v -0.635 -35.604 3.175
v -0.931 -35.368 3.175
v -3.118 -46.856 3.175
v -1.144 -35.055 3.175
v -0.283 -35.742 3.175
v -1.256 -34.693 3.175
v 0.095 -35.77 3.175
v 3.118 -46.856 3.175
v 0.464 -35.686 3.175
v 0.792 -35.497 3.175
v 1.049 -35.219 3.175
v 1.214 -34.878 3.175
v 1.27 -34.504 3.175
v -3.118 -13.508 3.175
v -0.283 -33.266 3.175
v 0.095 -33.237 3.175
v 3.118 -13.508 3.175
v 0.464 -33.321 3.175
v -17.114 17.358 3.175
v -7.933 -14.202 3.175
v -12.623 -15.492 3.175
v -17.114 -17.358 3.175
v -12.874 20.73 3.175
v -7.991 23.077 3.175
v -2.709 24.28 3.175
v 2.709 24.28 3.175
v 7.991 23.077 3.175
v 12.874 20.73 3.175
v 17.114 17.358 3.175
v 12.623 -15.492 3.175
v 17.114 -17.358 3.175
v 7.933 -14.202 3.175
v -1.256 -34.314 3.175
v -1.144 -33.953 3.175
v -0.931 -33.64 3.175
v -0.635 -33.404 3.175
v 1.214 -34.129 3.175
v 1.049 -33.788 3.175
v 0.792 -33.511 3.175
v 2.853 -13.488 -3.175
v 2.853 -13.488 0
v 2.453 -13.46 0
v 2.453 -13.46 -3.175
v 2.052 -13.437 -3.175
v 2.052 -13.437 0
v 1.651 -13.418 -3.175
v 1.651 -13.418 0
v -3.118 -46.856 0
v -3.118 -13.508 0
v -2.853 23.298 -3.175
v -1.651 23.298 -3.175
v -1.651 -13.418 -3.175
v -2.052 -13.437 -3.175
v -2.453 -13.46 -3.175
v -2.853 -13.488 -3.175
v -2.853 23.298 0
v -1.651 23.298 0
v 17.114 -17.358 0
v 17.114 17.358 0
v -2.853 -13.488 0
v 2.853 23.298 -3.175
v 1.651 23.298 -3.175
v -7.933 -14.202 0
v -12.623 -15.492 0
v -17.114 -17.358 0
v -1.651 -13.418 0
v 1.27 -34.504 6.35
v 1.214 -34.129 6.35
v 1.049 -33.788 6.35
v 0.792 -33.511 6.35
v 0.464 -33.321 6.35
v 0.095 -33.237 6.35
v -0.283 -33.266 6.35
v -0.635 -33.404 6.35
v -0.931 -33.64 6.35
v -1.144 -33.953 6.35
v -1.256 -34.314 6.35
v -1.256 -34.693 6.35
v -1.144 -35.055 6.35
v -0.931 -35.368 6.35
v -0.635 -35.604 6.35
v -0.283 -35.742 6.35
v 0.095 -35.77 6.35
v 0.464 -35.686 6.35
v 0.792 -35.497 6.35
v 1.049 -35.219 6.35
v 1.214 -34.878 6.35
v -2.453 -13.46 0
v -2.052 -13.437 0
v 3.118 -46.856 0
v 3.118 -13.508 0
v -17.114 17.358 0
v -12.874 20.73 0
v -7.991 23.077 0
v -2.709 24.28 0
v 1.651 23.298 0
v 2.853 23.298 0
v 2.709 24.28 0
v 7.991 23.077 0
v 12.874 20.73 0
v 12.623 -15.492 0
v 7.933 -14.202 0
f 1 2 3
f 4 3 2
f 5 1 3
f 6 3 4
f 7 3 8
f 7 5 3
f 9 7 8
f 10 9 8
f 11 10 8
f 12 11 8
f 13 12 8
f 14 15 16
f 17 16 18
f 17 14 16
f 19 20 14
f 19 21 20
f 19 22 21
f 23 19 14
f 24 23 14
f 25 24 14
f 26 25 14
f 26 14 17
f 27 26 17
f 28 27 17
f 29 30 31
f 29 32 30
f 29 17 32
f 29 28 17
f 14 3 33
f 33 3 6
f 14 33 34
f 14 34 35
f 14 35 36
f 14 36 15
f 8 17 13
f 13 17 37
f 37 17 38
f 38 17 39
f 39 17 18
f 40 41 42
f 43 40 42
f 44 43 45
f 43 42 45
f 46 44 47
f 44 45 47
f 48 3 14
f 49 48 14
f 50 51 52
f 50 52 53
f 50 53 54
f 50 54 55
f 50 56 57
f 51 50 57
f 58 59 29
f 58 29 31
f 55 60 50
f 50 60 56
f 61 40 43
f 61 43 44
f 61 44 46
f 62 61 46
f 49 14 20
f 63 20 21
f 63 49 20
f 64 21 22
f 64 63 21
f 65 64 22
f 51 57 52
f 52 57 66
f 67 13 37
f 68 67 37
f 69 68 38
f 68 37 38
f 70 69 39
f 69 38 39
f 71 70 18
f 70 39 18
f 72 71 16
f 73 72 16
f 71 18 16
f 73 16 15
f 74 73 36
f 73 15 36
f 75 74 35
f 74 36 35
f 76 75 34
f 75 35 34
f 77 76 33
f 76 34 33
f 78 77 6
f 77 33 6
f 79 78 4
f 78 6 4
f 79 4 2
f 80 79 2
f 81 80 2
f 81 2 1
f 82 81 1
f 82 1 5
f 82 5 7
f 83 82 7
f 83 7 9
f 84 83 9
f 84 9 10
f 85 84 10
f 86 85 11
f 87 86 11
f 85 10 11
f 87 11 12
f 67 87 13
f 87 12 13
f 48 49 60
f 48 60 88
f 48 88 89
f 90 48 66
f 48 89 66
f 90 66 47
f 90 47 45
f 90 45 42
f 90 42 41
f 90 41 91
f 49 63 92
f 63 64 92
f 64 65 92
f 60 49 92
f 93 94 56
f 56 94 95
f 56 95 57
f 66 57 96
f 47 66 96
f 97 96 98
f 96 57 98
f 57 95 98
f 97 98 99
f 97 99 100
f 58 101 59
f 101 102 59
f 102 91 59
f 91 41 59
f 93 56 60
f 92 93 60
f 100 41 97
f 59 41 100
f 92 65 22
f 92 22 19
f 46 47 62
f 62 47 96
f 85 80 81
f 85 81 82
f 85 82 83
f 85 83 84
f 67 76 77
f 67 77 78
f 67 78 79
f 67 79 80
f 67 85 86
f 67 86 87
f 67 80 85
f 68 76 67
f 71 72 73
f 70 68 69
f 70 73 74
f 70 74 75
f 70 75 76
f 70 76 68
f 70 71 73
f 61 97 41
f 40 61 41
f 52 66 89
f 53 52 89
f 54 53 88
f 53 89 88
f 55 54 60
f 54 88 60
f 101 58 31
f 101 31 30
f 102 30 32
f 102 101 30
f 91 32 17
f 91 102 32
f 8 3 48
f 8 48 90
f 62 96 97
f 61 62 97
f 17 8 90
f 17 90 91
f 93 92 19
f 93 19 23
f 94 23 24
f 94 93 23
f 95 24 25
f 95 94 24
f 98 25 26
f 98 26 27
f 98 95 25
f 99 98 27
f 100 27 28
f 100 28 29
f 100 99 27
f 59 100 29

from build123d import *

# Parameters (mm, degrees)
BOSS_EXTRUDE1_DEPTH = 3.175
BOSS_EXTRUDE2_DEPTH = 3.175
SKETCH3_W           = 6.236959702
SKETCH3_H           = 47.194711522
BOSS_EXTRUDE3_DEPTH = 3.175
SKETCH4_R           = 1.27
BOSS_EXTRUDE4_DEPTH = 3.175


with BuildPart() as part:
    # Sketch1 → Boss-Extrude1 (new body)
    with BuildSketch(Plane.XY):
        with BuildLine():
            Line((-17.114253333, -17.357583949), (-17.114253333, 17.357583949))
            ThreePointArc((-17.114253333, 17.357583949), (0, 24.432200125), (17.114253333, 17.357583949))
            Line((17.114253333, 17.357583949), (17.114253333, -17.357583949))
            ThreePointArc((17.114253333, -17.357583949), (0, -13.382802691), (-17.114253333, -17.357583949))
        make_face()
    extrude(amount=BOSS_EXTRUDE1_DEPTH)

    # Sketch2 → Boss-Extrude2 (add)
    with BuildSketch(Plane(origin=(0, 0, 0), x_dir=(-1, 0, 0), z_dir=(0, 0, -1))):
        with BuildLine():
            Line((-1.65128862, -13.417928303), (-1.65128862, 22.268343179))
            Line((-1.65128862, 22.268343179), (-1.65128862, 23.29835294))
            Line((-1.65128862, 23.29835294), (-2.853426735, 23.29835294))
            Line((-2.853426735, 23.29835294), (-2.853426735, -13.48778167))
            ThreePointArc((-2.853426735, -13.48778167), (-2.25262846, -13.448194961), (-1.65128862, -13.417928303))
        make_face()
        with BuildLine():
            Line((1.65128862, 23.29835294), (1.65128862, 22.268343179))
            Line((1.65128862, 22.268343179), (1.65128862, -13.417928303))
            ThreePointArc((1.65128862, -13.417928303), (2.25262846, -13.448194961), (2.853426735, -13.48778167))
            Line((2.853426735, -13.48778167), (2.853426735, 23.29835294))
            Line((2.853426735, 23.29835294), (1.65128862, 23.29835294))
        make_face()
    extrude(amount=BOSS_EXTRUDE2_DEPTH)

    # Sketch3 → Boss-Extrude3 (add)
    with BuildSketch(Plane.XY.offset(3.175)):
        with Locations((0, -23.258467244)):
            Rectangle(SKETCH3_W, SKETCH3_H)
    extrude(amount=-BOSS_EXTRUDE3_DEPTH)

    # Sketch4 → Boss-Extrude4 (add)
    with BuildSketch(Plane.XY.offset(3.175)):
        with Locations((0, -34.503683415)):
            Circle(SKETCH4_R)
    extrude(amount=BOSS_EXTRUDE4_DEPTH)


solid = part.part
